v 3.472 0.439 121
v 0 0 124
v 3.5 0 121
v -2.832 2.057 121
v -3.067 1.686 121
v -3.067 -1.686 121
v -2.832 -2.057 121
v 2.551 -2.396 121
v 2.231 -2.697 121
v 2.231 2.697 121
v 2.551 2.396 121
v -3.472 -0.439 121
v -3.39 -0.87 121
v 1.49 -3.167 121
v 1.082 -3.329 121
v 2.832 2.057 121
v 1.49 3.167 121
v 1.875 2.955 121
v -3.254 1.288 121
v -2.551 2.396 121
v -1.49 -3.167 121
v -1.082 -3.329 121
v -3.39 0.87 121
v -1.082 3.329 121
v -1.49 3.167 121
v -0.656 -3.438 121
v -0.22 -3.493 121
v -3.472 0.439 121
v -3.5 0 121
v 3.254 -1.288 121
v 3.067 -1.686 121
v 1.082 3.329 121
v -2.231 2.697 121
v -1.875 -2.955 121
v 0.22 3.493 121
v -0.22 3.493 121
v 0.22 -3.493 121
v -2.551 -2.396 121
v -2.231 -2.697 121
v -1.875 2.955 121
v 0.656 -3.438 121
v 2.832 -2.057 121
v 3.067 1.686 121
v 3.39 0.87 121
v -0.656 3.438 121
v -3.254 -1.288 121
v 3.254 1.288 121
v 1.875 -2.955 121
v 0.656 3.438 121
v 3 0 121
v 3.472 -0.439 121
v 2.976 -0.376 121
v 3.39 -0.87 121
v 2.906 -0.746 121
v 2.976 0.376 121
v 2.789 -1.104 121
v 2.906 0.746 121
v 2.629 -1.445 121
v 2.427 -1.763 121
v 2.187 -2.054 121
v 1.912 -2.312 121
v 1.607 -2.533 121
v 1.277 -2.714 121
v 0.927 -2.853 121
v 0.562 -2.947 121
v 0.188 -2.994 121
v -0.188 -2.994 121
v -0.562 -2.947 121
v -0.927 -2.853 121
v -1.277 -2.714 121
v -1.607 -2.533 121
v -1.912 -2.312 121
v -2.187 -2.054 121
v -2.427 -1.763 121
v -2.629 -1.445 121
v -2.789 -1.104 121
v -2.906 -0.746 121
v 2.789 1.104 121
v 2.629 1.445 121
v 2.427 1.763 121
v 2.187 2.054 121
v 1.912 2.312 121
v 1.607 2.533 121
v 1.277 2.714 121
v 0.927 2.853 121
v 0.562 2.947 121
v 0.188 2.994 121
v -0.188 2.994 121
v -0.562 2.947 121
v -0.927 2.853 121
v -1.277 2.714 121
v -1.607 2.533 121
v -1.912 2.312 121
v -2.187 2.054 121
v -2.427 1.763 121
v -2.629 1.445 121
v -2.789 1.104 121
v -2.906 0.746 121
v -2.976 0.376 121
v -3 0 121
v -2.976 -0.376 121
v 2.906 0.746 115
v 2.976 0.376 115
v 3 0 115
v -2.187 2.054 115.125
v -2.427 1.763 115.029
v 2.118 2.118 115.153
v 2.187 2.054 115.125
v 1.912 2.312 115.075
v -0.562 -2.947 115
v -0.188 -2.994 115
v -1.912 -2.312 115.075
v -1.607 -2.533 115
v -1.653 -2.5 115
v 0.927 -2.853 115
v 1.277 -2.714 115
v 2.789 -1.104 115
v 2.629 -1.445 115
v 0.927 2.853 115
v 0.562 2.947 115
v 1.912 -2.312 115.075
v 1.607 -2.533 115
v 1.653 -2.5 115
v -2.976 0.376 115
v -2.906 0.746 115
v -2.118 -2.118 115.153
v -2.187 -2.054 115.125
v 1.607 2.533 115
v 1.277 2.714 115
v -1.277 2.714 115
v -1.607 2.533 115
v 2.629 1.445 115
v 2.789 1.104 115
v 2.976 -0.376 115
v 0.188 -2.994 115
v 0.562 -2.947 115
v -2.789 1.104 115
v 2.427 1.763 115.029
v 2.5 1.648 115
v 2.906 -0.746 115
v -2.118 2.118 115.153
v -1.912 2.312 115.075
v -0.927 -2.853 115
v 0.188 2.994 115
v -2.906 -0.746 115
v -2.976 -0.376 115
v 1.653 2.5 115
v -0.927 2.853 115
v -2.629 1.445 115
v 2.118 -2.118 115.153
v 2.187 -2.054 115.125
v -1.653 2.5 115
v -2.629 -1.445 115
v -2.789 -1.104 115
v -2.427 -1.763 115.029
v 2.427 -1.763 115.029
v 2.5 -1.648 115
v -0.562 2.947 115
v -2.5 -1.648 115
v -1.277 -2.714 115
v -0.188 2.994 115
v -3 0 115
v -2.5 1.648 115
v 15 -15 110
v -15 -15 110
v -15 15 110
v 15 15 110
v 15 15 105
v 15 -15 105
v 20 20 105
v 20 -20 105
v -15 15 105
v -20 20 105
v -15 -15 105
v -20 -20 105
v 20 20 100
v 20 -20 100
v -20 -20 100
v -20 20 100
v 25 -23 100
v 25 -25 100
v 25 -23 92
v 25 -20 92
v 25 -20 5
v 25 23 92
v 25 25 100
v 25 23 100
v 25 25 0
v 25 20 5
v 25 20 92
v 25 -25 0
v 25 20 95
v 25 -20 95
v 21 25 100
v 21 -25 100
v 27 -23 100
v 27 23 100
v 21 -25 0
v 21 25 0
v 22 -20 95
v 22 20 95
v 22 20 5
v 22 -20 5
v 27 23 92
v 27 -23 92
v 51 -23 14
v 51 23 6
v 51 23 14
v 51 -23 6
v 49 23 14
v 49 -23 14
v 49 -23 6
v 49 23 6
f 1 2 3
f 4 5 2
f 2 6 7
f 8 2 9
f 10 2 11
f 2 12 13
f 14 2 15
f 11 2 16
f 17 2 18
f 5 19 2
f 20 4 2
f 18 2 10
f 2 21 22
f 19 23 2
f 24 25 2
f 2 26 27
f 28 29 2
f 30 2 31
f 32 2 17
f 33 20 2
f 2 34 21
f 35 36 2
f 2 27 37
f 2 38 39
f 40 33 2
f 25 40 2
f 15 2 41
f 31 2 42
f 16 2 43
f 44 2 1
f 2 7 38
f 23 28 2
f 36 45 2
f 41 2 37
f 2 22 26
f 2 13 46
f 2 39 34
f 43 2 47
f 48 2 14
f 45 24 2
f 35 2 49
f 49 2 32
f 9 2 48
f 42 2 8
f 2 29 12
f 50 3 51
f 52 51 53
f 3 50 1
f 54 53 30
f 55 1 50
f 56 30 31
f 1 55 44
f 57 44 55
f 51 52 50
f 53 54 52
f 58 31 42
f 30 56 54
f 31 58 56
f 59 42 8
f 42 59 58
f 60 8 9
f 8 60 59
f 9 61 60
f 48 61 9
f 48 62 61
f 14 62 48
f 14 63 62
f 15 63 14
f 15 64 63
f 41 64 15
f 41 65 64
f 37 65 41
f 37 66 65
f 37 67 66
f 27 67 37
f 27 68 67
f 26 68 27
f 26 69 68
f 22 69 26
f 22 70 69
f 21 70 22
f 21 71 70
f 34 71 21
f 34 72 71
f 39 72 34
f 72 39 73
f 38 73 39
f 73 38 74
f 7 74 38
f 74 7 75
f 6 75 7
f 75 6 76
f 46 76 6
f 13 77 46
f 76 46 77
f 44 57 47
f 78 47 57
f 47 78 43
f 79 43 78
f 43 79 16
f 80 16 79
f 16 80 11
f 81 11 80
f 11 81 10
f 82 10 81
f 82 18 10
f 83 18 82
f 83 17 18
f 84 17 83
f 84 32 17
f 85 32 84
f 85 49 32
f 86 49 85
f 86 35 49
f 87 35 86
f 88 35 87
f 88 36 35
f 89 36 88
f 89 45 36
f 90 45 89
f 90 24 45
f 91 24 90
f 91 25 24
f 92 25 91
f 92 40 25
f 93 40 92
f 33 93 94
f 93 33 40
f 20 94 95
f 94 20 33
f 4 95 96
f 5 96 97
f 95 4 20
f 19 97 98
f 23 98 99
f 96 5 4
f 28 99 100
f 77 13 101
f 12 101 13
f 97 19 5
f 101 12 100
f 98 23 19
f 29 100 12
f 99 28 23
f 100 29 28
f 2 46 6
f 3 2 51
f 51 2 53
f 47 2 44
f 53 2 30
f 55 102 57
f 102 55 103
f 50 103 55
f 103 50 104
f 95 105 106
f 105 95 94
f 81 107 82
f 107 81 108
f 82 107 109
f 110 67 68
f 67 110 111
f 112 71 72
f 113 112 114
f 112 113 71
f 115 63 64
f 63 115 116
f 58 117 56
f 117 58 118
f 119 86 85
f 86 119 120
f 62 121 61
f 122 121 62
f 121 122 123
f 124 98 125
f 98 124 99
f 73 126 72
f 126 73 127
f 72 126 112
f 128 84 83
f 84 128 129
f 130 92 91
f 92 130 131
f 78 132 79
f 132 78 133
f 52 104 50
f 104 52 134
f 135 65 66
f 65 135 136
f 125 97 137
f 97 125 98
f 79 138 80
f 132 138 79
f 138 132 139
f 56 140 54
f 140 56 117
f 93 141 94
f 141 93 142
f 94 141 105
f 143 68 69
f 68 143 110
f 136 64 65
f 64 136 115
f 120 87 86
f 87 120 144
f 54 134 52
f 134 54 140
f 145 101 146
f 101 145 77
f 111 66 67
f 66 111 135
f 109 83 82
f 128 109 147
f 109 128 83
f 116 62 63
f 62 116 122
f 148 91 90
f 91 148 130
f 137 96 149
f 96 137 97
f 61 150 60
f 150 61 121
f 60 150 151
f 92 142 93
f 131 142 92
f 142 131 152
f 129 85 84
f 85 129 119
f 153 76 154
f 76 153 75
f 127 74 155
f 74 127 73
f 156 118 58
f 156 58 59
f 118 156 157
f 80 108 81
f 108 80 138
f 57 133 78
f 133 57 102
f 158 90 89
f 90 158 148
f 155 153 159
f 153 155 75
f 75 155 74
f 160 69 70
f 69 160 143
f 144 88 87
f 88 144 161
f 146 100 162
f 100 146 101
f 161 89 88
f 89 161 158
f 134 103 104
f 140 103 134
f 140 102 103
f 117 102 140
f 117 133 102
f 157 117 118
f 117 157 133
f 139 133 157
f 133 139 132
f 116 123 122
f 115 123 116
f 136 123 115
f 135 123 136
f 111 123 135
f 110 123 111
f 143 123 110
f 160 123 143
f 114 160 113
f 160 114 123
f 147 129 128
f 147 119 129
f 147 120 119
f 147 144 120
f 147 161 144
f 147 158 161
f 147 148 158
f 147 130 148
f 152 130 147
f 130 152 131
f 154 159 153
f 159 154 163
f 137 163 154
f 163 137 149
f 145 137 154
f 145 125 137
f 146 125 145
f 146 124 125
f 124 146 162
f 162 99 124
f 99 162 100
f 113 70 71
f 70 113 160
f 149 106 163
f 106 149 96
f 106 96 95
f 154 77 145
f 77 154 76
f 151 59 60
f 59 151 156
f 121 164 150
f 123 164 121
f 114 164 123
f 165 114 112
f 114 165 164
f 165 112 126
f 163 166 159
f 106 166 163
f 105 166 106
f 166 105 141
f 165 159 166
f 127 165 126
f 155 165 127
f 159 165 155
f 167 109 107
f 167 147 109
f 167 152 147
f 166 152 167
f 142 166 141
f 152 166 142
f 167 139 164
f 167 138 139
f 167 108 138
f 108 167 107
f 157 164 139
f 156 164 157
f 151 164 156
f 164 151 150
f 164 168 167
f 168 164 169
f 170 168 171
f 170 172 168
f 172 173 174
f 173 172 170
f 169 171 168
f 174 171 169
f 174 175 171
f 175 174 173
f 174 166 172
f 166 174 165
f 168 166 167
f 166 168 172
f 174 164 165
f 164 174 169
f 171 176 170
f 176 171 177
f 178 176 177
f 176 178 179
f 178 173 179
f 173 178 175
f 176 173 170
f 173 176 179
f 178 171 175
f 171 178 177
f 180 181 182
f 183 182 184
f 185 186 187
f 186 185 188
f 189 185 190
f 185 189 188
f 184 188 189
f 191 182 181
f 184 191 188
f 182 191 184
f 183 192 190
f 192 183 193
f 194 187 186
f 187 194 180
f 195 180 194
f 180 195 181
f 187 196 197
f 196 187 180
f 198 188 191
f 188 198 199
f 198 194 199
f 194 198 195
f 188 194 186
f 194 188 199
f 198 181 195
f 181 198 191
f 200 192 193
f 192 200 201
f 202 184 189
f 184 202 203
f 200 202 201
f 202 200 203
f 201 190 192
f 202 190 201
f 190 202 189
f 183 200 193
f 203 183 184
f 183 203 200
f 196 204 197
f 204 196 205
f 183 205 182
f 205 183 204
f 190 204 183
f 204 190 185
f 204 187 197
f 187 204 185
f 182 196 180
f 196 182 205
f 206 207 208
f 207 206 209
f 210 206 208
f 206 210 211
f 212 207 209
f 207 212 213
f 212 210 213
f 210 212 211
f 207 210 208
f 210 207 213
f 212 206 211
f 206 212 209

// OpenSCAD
$fn=50;
tardis();
module tardis() {
    union() {
            translate([0, 0, 121]) cylinder(h = 3, r1 = 3.5, r2 = 0);
            translate([0, 0, 115]) cylinder(h = 6, r = 3);
            translate([0, 0, 110]) linear_extrude(6, scale = 0) square(30, center = true);
            translate([0, 0, 107.5]) cube([30, 30, 5], center = true);
            translate([0, 0, 102.5]) cube([40, 40, 5], center = true);
            //translate([0, 0, 50]) cube([50, 50, 100], center = true);
    }
    face();
}

module face() {
	translate([25, 0, 0]) {
    difference() {
            #translate([-4, -25, 0]) cube([4, 50, 100]);
            translate([-3, -20, 5]) cube([4, 40, 90]);
        }
        c=2;
        translate([c/2, 0, 100-c*2]) cube([c, 46, c*4], center=true);
        difference() {
			
			translate([25, 0, 10]) cube([c, 46, c * 4], center = true);
		}
    }
}
